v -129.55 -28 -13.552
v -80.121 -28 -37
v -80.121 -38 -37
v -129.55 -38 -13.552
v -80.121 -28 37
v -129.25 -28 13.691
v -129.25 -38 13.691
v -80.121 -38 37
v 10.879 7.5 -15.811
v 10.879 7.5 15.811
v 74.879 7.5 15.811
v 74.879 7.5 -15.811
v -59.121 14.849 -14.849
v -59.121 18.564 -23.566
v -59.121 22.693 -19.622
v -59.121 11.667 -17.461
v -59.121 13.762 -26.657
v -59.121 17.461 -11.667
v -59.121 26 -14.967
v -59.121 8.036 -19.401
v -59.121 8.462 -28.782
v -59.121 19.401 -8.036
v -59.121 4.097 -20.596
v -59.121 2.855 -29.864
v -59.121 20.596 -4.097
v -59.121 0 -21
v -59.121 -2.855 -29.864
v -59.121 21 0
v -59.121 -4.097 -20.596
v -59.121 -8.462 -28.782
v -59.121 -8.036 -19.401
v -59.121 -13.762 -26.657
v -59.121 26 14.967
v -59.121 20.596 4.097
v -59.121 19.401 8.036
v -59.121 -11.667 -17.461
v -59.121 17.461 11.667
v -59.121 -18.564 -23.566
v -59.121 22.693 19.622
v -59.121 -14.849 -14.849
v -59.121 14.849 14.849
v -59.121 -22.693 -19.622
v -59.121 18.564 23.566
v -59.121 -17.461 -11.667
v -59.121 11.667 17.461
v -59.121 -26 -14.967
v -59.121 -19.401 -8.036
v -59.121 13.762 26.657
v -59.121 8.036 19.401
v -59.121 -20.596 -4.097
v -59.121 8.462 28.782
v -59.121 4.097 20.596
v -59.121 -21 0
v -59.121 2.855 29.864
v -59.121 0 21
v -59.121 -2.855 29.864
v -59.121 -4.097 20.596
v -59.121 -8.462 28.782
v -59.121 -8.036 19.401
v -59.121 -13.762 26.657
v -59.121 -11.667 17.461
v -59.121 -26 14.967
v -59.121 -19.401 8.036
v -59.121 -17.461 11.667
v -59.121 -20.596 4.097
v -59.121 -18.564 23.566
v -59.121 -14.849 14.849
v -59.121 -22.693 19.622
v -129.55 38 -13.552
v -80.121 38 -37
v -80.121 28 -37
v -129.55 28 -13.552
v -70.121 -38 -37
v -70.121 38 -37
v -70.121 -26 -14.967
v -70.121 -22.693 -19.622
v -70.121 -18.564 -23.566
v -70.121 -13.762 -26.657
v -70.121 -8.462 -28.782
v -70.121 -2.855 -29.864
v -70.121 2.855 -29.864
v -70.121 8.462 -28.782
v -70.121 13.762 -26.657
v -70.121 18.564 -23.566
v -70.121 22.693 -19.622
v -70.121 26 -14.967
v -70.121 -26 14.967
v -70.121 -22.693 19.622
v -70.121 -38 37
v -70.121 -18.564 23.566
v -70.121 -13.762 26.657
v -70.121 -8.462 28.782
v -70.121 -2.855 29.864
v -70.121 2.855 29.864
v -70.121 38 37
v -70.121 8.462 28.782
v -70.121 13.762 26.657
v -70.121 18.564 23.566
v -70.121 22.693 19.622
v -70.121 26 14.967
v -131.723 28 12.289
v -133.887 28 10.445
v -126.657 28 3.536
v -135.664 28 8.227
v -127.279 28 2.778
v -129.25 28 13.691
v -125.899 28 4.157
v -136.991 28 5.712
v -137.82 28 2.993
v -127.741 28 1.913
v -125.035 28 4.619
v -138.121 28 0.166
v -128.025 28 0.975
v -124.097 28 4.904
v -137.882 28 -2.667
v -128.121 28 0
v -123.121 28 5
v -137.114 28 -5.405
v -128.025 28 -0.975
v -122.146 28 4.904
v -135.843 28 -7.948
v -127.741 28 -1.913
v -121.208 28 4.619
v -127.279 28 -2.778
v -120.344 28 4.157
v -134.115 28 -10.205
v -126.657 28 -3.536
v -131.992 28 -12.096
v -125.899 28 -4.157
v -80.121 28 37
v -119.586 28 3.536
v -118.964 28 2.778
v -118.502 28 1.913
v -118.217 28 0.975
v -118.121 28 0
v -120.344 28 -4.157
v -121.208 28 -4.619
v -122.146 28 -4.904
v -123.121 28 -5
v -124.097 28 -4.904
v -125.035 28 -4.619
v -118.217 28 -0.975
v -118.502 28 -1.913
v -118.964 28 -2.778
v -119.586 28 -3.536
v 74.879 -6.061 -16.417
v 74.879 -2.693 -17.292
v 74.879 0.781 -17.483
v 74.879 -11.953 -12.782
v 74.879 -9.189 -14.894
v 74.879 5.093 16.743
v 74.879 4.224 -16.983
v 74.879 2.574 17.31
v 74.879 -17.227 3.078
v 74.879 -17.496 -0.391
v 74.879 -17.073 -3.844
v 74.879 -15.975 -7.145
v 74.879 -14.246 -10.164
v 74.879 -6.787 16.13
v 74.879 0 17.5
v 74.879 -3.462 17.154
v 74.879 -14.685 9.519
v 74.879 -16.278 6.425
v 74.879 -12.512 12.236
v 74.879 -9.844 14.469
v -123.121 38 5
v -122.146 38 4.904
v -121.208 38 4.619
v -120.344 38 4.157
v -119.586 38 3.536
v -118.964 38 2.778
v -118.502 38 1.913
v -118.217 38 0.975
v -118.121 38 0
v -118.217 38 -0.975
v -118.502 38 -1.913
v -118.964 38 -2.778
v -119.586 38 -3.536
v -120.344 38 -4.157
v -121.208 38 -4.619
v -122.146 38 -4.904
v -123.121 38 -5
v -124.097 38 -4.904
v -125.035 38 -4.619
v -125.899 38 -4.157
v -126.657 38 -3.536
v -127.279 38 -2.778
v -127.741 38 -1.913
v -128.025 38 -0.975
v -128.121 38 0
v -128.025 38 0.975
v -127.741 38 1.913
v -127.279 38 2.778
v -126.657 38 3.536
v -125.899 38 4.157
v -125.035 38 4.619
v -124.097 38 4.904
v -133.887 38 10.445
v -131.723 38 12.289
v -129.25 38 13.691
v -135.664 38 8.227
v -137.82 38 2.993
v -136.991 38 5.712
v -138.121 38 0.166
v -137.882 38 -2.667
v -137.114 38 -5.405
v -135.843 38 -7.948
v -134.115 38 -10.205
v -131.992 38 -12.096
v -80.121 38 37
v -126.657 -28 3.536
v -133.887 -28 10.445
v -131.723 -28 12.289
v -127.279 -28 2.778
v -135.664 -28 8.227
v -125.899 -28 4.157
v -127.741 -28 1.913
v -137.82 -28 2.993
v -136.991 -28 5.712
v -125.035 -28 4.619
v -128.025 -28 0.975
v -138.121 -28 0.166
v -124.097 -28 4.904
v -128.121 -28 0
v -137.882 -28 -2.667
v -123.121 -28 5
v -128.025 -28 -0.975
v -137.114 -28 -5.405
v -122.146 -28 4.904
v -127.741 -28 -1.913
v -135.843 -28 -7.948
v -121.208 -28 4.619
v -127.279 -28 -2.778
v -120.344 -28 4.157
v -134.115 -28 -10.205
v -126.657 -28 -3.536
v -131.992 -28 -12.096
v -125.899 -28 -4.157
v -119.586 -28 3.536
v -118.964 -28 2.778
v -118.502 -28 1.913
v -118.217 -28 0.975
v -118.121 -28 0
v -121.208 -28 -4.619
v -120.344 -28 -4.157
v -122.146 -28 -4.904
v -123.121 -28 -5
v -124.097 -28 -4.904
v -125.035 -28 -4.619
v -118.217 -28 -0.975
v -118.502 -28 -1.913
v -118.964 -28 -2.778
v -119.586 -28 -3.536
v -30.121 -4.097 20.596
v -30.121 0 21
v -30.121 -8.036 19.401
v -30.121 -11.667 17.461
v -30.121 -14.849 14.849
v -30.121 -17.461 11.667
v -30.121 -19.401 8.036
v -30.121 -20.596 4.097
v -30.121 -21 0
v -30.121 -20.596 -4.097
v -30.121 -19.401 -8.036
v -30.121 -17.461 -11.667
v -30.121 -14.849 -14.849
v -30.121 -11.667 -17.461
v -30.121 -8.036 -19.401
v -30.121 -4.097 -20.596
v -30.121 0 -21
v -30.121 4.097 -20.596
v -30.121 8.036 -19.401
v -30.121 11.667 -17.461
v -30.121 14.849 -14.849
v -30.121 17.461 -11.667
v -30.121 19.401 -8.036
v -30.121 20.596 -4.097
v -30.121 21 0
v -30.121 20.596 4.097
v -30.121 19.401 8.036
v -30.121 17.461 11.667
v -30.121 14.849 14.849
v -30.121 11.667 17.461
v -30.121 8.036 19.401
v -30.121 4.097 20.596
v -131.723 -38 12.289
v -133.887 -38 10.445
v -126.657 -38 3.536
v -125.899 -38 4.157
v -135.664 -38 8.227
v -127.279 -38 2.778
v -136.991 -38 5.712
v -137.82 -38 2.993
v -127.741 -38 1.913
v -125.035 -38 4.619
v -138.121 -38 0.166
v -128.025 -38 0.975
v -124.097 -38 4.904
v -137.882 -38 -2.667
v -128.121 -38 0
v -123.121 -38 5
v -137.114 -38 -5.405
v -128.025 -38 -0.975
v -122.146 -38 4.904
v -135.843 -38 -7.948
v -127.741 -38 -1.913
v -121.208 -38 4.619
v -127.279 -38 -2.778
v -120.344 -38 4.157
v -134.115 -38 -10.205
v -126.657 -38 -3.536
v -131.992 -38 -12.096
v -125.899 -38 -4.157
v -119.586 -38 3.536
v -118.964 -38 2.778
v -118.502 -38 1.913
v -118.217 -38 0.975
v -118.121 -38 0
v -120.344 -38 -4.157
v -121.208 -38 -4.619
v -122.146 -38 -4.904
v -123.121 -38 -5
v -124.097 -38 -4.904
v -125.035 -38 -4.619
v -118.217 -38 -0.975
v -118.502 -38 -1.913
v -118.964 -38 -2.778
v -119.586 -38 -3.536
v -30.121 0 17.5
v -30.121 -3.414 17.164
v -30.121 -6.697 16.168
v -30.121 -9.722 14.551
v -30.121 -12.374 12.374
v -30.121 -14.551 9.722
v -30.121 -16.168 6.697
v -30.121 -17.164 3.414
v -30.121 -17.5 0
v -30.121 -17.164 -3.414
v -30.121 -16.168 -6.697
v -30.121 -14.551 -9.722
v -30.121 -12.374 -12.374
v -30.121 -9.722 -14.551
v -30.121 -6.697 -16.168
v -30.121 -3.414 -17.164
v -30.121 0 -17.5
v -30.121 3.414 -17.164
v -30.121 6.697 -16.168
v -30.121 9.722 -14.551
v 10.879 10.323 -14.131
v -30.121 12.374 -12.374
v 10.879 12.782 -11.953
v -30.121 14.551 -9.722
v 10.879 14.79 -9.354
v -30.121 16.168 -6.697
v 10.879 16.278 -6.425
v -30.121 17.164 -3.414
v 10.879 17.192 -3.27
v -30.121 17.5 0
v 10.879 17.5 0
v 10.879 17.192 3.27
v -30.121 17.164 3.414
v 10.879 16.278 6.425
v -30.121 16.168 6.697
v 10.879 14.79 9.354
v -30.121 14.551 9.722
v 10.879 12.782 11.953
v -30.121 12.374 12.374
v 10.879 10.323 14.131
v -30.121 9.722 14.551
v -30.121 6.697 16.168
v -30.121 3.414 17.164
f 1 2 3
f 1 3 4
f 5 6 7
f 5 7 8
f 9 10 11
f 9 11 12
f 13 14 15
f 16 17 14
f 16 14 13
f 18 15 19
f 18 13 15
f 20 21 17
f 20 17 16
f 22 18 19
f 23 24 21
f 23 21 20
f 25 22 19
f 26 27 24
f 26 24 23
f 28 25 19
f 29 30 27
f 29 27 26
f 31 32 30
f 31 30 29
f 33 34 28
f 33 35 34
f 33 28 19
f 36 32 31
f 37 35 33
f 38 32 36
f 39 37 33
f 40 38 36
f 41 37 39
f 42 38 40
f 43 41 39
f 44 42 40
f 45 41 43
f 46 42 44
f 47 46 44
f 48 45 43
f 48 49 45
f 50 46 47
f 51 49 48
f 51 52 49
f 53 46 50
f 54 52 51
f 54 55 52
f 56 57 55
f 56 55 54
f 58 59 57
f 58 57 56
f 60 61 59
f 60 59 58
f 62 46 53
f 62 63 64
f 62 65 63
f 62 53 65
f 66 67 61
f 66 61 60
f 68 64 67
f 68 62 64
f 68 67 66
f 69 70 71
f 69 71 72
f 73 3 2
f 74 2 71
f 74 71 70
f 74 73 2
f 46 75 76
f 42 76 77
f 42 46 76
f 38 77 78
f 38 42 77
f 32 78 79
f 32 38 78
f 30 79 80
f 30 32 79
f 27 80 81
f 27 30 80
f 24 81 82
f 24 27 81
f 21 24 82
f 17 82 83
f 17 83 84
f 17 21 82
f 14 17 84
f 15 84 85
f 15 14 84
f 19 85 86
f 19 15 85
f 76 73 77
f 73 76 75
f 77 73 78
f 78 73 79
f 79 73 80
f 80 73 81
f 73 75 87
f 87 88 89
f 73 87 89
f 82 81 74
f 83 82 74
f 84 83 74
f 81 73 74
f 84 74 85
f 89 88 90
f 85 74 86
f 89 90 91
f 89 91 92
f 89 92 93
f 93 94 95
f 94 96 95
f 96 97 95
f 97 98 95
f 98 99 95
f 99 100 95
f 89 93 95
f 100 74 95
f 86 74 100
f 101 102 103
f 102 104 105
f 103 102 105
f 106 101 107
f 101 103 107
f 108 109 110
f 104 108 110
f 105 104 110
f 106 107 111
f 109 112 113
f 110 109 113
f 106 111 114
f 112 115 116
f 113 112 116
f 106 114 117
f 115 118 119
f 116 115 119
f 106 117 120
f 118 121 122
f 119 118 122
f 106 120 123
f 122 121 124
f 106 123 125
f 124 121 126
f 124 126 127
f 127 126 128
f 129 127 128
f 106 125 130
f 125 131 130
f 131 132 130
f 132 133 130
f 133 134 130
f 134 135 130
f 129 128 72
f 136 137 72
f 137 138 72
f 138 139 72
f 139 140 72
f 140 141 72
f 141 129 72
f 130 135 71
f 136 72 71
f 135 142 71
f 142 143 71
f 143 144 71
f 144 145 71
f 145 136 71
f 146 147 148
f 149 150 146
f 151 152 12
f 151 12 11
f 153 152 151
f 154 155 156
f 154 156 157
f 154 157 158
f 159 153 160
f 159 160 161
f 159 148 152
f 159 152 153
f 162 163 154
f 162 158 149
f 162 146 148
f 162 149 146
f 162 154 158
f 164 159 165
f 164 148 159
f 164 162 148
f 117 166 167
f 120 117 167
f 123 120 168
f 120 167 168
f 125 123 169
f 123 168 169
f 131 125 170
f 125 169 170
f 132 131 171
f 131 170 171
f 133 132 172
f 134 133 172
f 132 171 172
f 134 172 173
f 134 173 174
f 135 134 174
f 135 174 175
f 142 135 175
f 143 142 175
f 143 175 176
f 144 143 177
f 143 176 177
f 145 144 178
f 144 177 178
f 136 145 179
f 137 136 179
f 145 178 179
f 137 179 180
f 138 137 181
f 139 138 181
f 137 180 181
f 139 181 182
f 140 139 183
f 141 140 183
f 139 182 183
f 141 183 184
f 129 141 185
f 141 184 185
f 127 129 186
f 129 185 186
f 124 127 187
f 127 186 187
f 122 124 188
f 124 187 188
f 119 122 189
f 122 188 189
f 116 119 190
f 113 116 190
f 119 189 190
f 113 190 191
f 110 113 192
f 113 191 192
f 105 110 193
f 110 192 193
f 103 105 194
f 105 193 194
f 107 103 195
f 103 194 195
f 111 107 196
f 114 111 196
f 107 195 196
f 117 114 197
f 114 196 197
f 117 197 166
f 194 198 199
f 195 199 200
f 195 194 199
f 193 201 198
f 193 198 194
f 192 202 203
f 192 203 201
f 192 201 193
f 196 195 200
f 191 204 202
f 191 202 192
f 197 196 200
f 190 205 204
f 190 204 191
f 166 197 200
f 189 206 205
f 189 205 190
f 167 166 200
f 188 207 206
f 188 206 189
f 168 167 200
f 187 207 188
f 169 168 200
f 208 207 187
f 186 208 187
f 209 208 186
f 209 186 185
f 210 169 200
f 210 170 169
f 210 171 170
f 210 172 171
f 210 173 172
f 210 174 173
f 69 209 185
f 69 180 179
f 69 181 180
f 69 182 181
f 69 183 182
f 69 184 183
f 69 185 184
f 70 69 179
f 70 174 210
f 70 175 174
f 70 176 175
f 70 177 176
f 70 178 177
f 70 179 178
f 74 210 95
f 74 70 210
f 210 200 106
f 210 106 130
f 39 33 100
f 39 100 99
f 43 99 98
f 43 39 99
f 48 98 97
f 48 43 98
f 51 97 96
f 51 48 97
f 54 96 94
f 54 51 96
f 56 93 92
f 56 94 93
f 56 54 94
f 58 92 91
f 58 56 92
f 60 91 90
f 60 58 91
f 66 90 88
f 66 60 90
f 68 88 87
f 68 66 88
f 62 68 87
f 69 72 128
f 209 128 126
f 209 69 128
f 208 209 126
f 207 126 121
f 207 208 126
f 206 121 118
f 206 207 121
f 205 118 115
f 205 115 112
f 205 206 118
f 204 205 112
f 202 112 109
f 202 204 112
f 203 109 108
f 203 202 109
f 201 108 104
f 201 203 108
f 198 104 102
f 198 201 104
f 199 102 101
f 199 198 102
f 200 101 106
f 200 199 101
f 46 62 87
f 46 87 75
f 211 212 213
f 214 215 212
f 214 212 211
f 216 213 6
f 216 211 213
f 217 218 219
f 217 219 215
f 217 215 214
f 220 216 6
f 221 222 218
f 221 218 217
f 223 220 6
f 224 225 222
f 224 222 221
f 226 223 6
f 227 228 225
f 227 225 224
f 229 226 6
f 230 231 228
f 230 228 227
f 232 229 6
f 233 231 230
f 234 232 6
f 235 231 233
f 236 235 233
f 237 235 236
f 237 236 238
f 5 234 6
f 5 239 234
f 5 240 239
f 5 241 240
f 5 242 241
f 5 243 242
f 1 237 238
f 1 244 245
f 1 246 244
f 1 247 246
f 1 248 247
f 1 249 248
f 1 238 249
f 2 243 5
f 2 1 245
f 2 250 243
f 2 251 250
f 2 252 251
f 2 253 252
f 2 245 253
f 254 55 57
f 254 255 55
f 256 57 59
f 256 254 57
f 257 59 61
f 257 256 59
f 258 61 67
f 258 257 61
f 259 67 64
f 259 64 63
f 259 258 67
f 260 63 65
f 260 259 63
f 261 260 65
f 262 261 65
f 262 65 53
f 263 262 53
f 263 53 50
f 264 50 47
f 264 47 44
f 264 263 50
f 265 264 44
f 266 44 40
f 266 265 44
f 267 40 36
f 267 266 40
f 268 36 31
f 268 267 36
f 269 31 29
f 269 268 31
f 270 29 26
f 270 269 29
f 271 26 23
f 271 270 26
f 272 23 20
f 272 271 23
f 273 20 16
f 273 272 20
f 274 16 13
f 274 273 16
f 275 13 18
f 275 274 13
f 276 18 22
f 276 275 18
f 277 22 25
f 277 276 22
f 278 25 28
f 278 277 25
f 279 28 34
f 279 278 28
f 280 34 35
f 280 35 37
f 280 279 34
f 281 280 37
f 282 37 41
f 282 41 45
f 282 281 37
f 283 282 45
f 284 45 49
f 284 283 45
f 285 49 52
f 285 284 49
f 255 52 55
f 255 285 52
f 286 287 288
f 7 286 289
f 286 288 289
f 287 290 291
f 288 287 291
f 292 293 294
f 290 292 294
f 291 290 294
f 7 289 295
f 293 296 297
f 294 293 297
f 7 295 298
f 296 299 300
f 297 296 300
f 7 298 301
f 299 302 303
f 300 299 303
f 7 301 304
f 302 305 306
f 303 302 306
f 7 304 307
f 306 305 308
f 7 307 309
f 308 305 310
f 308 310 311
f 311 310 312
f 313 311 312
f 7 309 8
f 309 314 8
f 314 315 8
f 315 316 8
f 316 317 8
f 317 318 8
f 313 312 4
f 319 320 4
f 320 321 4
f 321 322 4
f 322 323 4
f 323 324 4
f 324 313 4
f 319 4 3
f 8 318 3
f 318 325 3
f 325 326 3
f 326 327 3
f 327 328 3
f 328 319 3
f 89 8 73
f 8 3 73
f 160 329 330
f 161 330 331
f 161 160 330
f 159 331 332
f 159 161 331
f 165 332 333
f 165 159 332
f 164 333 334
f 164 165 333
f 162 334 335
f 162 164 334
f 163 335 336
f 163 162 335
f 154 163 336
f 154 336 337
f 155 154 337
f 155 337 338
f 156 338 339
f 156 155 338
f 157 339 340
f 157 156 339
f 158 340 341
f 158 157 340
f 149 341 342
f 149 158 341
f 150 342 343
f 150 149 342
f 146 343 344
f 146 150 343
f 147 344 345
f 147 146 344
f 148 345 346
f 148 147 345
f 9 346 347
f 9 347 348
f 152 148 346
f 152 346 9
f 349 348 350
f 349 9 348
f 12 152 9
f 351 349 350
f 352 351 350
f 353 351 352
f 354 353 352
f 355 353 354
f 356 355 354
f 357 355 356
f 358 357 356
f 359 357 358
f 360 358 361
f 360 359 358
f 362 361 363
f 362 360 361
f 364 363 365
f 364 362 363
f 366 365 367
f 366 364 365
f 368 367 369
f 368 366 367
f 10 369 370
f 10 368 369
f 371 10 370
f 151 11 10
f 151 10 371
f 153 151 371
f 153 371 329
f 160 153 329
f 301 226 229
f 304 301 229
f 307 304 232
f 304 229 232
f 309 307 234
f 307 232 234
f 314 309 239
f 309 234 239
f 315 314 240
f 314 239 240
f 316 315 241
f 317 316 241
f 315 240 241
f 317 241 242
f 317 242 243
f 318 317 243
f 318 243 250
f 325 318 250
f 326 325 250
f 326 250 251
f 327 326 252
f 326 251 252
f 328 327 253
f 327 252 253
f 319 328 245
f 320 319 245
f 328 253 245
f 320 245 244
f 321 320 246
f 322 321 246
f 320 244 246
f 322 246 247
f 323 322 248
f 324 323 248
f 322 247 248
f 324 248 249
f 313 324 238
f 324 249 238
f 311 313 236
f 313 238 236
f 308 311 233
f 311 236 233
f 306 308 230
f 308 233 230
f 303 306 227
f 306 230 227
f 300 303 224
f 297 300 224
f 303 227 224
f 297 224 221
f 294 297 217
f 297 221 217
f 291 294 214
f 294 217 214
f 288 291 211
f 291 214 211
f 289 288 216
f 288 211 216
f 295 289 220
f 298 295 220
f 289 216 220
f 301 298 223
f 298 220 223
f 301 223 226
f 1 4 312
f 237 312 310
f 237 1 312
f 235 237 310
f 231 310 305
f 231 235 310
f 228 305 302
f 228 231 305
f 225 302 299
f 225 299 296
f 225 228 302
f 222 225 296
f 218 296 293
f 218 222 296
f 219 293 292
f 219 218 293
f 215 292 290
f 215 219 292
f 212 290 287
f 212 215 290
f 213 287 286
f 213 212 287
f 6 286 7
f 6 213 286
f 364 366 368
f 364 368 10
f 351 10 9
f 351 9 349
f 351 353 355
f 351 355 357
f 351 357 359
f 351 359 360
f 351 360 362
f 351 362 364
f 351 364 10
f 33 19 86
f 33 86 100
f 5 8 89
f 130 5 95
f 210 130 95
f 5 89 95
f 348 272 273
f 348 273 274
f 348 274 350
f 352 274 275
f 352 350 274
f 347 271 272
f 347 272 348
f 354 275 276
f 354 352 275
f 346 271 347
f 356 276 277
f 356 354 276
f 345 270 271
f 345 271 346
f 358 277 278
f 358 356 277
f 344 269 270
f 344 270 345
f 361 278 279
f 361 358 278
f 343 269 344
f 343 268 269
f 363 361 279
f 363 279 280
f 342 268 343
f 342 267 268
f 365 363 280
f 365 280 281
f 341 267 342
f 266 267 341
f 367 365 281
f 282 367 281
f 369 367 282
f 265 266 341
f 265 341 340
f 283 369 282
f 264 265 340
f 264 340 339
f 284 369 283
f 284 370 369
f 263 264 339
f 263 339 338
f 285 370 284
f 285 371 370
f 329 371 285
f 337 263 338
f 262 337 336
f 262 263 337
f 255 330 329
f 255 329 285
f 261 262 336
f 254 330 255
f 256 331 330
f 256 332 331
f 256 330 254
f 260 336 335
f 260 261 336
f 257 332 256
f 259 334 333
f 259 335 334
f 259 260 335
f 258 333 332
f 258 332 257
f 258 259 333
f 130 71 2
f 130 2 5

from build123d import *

# Parameters (mm, degrees)
CUT_EXTRUDE_1_DEPTH = 64
CUT_EXTRUDE_START   = -64
CUT_EXTRUDE_2_DEPTH = 64
SKETCH_4_W          = 74
SKETCH_4_H          = 76
EXTRUDE_1_DEPTH     = 10
EXTRUDE_START       = -66
SKETCH_5_R          = 5
EXTRUDE_2_DEPTH     = 10
SKETCH_5_3_R        = 5
EXTRUDE_3_DEPTH     = 10


with BuildPart() as part:
    # 스케치1 → 회전1 (revolve)
    with BuildSketch(Plane(origin=(0, 0, 0), x_dir=(1, 0, 0), z_dir=(0, 1, 0))):
        Polygon((74.878584377, 0), (-70.121415623, 0), (-70.121415623, -30), (-59.121415623, -30), (-59.121415623, -21), (-30.121415623, -21), (-30.121415623, -17.5), (74.878584377, -17.5), align=None)
    revolve(axis=Axis((-70.121415623, 0, 0), (1, 0, 0)))

    # 스케치2 → 컷-돌출1 (cut)
    with BuildSketch(Plane(origin=(74.878584377, 0, 0), x_dir=(0, 0, -1), z_dir=(1, 0, 0))):
        with BuildLine():
            ThreePointArc((15.811388301, 7.5), (0, 17.5), (-15.811388301, 7.5))
            Line((-15.811388301, 7.5), (15.811388301, 7.5))
        make_face()
    extrude(amount=-CUT_EXTRUDE_1_DEPTH, mode=Mode.SUBTRACT)

    # 스케치3 → 컷-돌출2 (cut)
    with BuildSketch(Plane.ZY.offset(70.121415623).offset(CUT_EXTRUDE_START)):
        with BuildLine():
            ThreePointArc((14.966629547, 26), (0, 30), (-14.966629547, 26))
            Line((-14.966629547, 26), (14.966629547, 26))
        make_face()
        with BuildLine():
            Line((14.966629547, -26), (-14.966629547, -26))
            ThreePointArc((-14.966629547, -26), (0, -30), (14.966629547, -26))
        make_face()
    extrude(amount=CUT_EXTRUDE_2_DEPTH, mode=Mode.SUBTRACT)

    # 스케치4 → 보스-돌출1 (add)
    with BuildSketch(Plane.ZY.offset(70.121415623)):
        Rectangle(SKETCH_4_W, SKETCH_4_H)
    extrude(amount=EXTRUDE_1_DEPTH)

    # 스케치5 → 보스-돌출2 (add)
    with BuildSketch(Plane(origin=(0, 38, 0), x_dir=(1, 0, 0), z_dir=(0, 1, 0)).offset(EXTRUDE_START)):
        with BuildLine():
            Line((-80.121415623, -37), (-80.121415623, 37))
            Line((-80.121415623, 37), (-129.550289518, 13.552475067))
            ThreePointArc((-129.550289518, 13.552475067), (-138.120501498, -0.165598609), (-129.249504521, -13.691111221))
            Line((-129.249504521, -13.691111221), (-80.121415623, -37))
        make_face()
        with Locations((-123.121415623, 0)):
            Circle(SKETCH_5_R, mode=Mode.SUBTRACT)
    extrude(amount=-EXTRUDE_2_DEPTH)

    # 스케치5<3> → 보스-돌출3 (add)
    with BuildSketch(Plane(origin=(0, 38, 0), x_dir=(1, 0, 0), z_dir=(0, 1, 0))):
        with BuildLine():
            Line((-80.121415623, -37), (-80.121415623, 37))
            Line((-80.121415623, 37), (-129.550289518, 13.552475067))
            ThreePointArc((-129.550289518, 13.552475067), (-138.120501498, -0.165598609), (-129.249504521, -13.691111221))
            Line((-129.249504521, -13.691111221), (-80.121415623, -37))
        make_face()
        with Locations((-123.121415623, 0)):
            Circle(SKETCH_5_3_R, mode=Mode.SUBTRACT)
    extrude(amount=-EXTRUDE_3_DEPTH)


solid = part.part
